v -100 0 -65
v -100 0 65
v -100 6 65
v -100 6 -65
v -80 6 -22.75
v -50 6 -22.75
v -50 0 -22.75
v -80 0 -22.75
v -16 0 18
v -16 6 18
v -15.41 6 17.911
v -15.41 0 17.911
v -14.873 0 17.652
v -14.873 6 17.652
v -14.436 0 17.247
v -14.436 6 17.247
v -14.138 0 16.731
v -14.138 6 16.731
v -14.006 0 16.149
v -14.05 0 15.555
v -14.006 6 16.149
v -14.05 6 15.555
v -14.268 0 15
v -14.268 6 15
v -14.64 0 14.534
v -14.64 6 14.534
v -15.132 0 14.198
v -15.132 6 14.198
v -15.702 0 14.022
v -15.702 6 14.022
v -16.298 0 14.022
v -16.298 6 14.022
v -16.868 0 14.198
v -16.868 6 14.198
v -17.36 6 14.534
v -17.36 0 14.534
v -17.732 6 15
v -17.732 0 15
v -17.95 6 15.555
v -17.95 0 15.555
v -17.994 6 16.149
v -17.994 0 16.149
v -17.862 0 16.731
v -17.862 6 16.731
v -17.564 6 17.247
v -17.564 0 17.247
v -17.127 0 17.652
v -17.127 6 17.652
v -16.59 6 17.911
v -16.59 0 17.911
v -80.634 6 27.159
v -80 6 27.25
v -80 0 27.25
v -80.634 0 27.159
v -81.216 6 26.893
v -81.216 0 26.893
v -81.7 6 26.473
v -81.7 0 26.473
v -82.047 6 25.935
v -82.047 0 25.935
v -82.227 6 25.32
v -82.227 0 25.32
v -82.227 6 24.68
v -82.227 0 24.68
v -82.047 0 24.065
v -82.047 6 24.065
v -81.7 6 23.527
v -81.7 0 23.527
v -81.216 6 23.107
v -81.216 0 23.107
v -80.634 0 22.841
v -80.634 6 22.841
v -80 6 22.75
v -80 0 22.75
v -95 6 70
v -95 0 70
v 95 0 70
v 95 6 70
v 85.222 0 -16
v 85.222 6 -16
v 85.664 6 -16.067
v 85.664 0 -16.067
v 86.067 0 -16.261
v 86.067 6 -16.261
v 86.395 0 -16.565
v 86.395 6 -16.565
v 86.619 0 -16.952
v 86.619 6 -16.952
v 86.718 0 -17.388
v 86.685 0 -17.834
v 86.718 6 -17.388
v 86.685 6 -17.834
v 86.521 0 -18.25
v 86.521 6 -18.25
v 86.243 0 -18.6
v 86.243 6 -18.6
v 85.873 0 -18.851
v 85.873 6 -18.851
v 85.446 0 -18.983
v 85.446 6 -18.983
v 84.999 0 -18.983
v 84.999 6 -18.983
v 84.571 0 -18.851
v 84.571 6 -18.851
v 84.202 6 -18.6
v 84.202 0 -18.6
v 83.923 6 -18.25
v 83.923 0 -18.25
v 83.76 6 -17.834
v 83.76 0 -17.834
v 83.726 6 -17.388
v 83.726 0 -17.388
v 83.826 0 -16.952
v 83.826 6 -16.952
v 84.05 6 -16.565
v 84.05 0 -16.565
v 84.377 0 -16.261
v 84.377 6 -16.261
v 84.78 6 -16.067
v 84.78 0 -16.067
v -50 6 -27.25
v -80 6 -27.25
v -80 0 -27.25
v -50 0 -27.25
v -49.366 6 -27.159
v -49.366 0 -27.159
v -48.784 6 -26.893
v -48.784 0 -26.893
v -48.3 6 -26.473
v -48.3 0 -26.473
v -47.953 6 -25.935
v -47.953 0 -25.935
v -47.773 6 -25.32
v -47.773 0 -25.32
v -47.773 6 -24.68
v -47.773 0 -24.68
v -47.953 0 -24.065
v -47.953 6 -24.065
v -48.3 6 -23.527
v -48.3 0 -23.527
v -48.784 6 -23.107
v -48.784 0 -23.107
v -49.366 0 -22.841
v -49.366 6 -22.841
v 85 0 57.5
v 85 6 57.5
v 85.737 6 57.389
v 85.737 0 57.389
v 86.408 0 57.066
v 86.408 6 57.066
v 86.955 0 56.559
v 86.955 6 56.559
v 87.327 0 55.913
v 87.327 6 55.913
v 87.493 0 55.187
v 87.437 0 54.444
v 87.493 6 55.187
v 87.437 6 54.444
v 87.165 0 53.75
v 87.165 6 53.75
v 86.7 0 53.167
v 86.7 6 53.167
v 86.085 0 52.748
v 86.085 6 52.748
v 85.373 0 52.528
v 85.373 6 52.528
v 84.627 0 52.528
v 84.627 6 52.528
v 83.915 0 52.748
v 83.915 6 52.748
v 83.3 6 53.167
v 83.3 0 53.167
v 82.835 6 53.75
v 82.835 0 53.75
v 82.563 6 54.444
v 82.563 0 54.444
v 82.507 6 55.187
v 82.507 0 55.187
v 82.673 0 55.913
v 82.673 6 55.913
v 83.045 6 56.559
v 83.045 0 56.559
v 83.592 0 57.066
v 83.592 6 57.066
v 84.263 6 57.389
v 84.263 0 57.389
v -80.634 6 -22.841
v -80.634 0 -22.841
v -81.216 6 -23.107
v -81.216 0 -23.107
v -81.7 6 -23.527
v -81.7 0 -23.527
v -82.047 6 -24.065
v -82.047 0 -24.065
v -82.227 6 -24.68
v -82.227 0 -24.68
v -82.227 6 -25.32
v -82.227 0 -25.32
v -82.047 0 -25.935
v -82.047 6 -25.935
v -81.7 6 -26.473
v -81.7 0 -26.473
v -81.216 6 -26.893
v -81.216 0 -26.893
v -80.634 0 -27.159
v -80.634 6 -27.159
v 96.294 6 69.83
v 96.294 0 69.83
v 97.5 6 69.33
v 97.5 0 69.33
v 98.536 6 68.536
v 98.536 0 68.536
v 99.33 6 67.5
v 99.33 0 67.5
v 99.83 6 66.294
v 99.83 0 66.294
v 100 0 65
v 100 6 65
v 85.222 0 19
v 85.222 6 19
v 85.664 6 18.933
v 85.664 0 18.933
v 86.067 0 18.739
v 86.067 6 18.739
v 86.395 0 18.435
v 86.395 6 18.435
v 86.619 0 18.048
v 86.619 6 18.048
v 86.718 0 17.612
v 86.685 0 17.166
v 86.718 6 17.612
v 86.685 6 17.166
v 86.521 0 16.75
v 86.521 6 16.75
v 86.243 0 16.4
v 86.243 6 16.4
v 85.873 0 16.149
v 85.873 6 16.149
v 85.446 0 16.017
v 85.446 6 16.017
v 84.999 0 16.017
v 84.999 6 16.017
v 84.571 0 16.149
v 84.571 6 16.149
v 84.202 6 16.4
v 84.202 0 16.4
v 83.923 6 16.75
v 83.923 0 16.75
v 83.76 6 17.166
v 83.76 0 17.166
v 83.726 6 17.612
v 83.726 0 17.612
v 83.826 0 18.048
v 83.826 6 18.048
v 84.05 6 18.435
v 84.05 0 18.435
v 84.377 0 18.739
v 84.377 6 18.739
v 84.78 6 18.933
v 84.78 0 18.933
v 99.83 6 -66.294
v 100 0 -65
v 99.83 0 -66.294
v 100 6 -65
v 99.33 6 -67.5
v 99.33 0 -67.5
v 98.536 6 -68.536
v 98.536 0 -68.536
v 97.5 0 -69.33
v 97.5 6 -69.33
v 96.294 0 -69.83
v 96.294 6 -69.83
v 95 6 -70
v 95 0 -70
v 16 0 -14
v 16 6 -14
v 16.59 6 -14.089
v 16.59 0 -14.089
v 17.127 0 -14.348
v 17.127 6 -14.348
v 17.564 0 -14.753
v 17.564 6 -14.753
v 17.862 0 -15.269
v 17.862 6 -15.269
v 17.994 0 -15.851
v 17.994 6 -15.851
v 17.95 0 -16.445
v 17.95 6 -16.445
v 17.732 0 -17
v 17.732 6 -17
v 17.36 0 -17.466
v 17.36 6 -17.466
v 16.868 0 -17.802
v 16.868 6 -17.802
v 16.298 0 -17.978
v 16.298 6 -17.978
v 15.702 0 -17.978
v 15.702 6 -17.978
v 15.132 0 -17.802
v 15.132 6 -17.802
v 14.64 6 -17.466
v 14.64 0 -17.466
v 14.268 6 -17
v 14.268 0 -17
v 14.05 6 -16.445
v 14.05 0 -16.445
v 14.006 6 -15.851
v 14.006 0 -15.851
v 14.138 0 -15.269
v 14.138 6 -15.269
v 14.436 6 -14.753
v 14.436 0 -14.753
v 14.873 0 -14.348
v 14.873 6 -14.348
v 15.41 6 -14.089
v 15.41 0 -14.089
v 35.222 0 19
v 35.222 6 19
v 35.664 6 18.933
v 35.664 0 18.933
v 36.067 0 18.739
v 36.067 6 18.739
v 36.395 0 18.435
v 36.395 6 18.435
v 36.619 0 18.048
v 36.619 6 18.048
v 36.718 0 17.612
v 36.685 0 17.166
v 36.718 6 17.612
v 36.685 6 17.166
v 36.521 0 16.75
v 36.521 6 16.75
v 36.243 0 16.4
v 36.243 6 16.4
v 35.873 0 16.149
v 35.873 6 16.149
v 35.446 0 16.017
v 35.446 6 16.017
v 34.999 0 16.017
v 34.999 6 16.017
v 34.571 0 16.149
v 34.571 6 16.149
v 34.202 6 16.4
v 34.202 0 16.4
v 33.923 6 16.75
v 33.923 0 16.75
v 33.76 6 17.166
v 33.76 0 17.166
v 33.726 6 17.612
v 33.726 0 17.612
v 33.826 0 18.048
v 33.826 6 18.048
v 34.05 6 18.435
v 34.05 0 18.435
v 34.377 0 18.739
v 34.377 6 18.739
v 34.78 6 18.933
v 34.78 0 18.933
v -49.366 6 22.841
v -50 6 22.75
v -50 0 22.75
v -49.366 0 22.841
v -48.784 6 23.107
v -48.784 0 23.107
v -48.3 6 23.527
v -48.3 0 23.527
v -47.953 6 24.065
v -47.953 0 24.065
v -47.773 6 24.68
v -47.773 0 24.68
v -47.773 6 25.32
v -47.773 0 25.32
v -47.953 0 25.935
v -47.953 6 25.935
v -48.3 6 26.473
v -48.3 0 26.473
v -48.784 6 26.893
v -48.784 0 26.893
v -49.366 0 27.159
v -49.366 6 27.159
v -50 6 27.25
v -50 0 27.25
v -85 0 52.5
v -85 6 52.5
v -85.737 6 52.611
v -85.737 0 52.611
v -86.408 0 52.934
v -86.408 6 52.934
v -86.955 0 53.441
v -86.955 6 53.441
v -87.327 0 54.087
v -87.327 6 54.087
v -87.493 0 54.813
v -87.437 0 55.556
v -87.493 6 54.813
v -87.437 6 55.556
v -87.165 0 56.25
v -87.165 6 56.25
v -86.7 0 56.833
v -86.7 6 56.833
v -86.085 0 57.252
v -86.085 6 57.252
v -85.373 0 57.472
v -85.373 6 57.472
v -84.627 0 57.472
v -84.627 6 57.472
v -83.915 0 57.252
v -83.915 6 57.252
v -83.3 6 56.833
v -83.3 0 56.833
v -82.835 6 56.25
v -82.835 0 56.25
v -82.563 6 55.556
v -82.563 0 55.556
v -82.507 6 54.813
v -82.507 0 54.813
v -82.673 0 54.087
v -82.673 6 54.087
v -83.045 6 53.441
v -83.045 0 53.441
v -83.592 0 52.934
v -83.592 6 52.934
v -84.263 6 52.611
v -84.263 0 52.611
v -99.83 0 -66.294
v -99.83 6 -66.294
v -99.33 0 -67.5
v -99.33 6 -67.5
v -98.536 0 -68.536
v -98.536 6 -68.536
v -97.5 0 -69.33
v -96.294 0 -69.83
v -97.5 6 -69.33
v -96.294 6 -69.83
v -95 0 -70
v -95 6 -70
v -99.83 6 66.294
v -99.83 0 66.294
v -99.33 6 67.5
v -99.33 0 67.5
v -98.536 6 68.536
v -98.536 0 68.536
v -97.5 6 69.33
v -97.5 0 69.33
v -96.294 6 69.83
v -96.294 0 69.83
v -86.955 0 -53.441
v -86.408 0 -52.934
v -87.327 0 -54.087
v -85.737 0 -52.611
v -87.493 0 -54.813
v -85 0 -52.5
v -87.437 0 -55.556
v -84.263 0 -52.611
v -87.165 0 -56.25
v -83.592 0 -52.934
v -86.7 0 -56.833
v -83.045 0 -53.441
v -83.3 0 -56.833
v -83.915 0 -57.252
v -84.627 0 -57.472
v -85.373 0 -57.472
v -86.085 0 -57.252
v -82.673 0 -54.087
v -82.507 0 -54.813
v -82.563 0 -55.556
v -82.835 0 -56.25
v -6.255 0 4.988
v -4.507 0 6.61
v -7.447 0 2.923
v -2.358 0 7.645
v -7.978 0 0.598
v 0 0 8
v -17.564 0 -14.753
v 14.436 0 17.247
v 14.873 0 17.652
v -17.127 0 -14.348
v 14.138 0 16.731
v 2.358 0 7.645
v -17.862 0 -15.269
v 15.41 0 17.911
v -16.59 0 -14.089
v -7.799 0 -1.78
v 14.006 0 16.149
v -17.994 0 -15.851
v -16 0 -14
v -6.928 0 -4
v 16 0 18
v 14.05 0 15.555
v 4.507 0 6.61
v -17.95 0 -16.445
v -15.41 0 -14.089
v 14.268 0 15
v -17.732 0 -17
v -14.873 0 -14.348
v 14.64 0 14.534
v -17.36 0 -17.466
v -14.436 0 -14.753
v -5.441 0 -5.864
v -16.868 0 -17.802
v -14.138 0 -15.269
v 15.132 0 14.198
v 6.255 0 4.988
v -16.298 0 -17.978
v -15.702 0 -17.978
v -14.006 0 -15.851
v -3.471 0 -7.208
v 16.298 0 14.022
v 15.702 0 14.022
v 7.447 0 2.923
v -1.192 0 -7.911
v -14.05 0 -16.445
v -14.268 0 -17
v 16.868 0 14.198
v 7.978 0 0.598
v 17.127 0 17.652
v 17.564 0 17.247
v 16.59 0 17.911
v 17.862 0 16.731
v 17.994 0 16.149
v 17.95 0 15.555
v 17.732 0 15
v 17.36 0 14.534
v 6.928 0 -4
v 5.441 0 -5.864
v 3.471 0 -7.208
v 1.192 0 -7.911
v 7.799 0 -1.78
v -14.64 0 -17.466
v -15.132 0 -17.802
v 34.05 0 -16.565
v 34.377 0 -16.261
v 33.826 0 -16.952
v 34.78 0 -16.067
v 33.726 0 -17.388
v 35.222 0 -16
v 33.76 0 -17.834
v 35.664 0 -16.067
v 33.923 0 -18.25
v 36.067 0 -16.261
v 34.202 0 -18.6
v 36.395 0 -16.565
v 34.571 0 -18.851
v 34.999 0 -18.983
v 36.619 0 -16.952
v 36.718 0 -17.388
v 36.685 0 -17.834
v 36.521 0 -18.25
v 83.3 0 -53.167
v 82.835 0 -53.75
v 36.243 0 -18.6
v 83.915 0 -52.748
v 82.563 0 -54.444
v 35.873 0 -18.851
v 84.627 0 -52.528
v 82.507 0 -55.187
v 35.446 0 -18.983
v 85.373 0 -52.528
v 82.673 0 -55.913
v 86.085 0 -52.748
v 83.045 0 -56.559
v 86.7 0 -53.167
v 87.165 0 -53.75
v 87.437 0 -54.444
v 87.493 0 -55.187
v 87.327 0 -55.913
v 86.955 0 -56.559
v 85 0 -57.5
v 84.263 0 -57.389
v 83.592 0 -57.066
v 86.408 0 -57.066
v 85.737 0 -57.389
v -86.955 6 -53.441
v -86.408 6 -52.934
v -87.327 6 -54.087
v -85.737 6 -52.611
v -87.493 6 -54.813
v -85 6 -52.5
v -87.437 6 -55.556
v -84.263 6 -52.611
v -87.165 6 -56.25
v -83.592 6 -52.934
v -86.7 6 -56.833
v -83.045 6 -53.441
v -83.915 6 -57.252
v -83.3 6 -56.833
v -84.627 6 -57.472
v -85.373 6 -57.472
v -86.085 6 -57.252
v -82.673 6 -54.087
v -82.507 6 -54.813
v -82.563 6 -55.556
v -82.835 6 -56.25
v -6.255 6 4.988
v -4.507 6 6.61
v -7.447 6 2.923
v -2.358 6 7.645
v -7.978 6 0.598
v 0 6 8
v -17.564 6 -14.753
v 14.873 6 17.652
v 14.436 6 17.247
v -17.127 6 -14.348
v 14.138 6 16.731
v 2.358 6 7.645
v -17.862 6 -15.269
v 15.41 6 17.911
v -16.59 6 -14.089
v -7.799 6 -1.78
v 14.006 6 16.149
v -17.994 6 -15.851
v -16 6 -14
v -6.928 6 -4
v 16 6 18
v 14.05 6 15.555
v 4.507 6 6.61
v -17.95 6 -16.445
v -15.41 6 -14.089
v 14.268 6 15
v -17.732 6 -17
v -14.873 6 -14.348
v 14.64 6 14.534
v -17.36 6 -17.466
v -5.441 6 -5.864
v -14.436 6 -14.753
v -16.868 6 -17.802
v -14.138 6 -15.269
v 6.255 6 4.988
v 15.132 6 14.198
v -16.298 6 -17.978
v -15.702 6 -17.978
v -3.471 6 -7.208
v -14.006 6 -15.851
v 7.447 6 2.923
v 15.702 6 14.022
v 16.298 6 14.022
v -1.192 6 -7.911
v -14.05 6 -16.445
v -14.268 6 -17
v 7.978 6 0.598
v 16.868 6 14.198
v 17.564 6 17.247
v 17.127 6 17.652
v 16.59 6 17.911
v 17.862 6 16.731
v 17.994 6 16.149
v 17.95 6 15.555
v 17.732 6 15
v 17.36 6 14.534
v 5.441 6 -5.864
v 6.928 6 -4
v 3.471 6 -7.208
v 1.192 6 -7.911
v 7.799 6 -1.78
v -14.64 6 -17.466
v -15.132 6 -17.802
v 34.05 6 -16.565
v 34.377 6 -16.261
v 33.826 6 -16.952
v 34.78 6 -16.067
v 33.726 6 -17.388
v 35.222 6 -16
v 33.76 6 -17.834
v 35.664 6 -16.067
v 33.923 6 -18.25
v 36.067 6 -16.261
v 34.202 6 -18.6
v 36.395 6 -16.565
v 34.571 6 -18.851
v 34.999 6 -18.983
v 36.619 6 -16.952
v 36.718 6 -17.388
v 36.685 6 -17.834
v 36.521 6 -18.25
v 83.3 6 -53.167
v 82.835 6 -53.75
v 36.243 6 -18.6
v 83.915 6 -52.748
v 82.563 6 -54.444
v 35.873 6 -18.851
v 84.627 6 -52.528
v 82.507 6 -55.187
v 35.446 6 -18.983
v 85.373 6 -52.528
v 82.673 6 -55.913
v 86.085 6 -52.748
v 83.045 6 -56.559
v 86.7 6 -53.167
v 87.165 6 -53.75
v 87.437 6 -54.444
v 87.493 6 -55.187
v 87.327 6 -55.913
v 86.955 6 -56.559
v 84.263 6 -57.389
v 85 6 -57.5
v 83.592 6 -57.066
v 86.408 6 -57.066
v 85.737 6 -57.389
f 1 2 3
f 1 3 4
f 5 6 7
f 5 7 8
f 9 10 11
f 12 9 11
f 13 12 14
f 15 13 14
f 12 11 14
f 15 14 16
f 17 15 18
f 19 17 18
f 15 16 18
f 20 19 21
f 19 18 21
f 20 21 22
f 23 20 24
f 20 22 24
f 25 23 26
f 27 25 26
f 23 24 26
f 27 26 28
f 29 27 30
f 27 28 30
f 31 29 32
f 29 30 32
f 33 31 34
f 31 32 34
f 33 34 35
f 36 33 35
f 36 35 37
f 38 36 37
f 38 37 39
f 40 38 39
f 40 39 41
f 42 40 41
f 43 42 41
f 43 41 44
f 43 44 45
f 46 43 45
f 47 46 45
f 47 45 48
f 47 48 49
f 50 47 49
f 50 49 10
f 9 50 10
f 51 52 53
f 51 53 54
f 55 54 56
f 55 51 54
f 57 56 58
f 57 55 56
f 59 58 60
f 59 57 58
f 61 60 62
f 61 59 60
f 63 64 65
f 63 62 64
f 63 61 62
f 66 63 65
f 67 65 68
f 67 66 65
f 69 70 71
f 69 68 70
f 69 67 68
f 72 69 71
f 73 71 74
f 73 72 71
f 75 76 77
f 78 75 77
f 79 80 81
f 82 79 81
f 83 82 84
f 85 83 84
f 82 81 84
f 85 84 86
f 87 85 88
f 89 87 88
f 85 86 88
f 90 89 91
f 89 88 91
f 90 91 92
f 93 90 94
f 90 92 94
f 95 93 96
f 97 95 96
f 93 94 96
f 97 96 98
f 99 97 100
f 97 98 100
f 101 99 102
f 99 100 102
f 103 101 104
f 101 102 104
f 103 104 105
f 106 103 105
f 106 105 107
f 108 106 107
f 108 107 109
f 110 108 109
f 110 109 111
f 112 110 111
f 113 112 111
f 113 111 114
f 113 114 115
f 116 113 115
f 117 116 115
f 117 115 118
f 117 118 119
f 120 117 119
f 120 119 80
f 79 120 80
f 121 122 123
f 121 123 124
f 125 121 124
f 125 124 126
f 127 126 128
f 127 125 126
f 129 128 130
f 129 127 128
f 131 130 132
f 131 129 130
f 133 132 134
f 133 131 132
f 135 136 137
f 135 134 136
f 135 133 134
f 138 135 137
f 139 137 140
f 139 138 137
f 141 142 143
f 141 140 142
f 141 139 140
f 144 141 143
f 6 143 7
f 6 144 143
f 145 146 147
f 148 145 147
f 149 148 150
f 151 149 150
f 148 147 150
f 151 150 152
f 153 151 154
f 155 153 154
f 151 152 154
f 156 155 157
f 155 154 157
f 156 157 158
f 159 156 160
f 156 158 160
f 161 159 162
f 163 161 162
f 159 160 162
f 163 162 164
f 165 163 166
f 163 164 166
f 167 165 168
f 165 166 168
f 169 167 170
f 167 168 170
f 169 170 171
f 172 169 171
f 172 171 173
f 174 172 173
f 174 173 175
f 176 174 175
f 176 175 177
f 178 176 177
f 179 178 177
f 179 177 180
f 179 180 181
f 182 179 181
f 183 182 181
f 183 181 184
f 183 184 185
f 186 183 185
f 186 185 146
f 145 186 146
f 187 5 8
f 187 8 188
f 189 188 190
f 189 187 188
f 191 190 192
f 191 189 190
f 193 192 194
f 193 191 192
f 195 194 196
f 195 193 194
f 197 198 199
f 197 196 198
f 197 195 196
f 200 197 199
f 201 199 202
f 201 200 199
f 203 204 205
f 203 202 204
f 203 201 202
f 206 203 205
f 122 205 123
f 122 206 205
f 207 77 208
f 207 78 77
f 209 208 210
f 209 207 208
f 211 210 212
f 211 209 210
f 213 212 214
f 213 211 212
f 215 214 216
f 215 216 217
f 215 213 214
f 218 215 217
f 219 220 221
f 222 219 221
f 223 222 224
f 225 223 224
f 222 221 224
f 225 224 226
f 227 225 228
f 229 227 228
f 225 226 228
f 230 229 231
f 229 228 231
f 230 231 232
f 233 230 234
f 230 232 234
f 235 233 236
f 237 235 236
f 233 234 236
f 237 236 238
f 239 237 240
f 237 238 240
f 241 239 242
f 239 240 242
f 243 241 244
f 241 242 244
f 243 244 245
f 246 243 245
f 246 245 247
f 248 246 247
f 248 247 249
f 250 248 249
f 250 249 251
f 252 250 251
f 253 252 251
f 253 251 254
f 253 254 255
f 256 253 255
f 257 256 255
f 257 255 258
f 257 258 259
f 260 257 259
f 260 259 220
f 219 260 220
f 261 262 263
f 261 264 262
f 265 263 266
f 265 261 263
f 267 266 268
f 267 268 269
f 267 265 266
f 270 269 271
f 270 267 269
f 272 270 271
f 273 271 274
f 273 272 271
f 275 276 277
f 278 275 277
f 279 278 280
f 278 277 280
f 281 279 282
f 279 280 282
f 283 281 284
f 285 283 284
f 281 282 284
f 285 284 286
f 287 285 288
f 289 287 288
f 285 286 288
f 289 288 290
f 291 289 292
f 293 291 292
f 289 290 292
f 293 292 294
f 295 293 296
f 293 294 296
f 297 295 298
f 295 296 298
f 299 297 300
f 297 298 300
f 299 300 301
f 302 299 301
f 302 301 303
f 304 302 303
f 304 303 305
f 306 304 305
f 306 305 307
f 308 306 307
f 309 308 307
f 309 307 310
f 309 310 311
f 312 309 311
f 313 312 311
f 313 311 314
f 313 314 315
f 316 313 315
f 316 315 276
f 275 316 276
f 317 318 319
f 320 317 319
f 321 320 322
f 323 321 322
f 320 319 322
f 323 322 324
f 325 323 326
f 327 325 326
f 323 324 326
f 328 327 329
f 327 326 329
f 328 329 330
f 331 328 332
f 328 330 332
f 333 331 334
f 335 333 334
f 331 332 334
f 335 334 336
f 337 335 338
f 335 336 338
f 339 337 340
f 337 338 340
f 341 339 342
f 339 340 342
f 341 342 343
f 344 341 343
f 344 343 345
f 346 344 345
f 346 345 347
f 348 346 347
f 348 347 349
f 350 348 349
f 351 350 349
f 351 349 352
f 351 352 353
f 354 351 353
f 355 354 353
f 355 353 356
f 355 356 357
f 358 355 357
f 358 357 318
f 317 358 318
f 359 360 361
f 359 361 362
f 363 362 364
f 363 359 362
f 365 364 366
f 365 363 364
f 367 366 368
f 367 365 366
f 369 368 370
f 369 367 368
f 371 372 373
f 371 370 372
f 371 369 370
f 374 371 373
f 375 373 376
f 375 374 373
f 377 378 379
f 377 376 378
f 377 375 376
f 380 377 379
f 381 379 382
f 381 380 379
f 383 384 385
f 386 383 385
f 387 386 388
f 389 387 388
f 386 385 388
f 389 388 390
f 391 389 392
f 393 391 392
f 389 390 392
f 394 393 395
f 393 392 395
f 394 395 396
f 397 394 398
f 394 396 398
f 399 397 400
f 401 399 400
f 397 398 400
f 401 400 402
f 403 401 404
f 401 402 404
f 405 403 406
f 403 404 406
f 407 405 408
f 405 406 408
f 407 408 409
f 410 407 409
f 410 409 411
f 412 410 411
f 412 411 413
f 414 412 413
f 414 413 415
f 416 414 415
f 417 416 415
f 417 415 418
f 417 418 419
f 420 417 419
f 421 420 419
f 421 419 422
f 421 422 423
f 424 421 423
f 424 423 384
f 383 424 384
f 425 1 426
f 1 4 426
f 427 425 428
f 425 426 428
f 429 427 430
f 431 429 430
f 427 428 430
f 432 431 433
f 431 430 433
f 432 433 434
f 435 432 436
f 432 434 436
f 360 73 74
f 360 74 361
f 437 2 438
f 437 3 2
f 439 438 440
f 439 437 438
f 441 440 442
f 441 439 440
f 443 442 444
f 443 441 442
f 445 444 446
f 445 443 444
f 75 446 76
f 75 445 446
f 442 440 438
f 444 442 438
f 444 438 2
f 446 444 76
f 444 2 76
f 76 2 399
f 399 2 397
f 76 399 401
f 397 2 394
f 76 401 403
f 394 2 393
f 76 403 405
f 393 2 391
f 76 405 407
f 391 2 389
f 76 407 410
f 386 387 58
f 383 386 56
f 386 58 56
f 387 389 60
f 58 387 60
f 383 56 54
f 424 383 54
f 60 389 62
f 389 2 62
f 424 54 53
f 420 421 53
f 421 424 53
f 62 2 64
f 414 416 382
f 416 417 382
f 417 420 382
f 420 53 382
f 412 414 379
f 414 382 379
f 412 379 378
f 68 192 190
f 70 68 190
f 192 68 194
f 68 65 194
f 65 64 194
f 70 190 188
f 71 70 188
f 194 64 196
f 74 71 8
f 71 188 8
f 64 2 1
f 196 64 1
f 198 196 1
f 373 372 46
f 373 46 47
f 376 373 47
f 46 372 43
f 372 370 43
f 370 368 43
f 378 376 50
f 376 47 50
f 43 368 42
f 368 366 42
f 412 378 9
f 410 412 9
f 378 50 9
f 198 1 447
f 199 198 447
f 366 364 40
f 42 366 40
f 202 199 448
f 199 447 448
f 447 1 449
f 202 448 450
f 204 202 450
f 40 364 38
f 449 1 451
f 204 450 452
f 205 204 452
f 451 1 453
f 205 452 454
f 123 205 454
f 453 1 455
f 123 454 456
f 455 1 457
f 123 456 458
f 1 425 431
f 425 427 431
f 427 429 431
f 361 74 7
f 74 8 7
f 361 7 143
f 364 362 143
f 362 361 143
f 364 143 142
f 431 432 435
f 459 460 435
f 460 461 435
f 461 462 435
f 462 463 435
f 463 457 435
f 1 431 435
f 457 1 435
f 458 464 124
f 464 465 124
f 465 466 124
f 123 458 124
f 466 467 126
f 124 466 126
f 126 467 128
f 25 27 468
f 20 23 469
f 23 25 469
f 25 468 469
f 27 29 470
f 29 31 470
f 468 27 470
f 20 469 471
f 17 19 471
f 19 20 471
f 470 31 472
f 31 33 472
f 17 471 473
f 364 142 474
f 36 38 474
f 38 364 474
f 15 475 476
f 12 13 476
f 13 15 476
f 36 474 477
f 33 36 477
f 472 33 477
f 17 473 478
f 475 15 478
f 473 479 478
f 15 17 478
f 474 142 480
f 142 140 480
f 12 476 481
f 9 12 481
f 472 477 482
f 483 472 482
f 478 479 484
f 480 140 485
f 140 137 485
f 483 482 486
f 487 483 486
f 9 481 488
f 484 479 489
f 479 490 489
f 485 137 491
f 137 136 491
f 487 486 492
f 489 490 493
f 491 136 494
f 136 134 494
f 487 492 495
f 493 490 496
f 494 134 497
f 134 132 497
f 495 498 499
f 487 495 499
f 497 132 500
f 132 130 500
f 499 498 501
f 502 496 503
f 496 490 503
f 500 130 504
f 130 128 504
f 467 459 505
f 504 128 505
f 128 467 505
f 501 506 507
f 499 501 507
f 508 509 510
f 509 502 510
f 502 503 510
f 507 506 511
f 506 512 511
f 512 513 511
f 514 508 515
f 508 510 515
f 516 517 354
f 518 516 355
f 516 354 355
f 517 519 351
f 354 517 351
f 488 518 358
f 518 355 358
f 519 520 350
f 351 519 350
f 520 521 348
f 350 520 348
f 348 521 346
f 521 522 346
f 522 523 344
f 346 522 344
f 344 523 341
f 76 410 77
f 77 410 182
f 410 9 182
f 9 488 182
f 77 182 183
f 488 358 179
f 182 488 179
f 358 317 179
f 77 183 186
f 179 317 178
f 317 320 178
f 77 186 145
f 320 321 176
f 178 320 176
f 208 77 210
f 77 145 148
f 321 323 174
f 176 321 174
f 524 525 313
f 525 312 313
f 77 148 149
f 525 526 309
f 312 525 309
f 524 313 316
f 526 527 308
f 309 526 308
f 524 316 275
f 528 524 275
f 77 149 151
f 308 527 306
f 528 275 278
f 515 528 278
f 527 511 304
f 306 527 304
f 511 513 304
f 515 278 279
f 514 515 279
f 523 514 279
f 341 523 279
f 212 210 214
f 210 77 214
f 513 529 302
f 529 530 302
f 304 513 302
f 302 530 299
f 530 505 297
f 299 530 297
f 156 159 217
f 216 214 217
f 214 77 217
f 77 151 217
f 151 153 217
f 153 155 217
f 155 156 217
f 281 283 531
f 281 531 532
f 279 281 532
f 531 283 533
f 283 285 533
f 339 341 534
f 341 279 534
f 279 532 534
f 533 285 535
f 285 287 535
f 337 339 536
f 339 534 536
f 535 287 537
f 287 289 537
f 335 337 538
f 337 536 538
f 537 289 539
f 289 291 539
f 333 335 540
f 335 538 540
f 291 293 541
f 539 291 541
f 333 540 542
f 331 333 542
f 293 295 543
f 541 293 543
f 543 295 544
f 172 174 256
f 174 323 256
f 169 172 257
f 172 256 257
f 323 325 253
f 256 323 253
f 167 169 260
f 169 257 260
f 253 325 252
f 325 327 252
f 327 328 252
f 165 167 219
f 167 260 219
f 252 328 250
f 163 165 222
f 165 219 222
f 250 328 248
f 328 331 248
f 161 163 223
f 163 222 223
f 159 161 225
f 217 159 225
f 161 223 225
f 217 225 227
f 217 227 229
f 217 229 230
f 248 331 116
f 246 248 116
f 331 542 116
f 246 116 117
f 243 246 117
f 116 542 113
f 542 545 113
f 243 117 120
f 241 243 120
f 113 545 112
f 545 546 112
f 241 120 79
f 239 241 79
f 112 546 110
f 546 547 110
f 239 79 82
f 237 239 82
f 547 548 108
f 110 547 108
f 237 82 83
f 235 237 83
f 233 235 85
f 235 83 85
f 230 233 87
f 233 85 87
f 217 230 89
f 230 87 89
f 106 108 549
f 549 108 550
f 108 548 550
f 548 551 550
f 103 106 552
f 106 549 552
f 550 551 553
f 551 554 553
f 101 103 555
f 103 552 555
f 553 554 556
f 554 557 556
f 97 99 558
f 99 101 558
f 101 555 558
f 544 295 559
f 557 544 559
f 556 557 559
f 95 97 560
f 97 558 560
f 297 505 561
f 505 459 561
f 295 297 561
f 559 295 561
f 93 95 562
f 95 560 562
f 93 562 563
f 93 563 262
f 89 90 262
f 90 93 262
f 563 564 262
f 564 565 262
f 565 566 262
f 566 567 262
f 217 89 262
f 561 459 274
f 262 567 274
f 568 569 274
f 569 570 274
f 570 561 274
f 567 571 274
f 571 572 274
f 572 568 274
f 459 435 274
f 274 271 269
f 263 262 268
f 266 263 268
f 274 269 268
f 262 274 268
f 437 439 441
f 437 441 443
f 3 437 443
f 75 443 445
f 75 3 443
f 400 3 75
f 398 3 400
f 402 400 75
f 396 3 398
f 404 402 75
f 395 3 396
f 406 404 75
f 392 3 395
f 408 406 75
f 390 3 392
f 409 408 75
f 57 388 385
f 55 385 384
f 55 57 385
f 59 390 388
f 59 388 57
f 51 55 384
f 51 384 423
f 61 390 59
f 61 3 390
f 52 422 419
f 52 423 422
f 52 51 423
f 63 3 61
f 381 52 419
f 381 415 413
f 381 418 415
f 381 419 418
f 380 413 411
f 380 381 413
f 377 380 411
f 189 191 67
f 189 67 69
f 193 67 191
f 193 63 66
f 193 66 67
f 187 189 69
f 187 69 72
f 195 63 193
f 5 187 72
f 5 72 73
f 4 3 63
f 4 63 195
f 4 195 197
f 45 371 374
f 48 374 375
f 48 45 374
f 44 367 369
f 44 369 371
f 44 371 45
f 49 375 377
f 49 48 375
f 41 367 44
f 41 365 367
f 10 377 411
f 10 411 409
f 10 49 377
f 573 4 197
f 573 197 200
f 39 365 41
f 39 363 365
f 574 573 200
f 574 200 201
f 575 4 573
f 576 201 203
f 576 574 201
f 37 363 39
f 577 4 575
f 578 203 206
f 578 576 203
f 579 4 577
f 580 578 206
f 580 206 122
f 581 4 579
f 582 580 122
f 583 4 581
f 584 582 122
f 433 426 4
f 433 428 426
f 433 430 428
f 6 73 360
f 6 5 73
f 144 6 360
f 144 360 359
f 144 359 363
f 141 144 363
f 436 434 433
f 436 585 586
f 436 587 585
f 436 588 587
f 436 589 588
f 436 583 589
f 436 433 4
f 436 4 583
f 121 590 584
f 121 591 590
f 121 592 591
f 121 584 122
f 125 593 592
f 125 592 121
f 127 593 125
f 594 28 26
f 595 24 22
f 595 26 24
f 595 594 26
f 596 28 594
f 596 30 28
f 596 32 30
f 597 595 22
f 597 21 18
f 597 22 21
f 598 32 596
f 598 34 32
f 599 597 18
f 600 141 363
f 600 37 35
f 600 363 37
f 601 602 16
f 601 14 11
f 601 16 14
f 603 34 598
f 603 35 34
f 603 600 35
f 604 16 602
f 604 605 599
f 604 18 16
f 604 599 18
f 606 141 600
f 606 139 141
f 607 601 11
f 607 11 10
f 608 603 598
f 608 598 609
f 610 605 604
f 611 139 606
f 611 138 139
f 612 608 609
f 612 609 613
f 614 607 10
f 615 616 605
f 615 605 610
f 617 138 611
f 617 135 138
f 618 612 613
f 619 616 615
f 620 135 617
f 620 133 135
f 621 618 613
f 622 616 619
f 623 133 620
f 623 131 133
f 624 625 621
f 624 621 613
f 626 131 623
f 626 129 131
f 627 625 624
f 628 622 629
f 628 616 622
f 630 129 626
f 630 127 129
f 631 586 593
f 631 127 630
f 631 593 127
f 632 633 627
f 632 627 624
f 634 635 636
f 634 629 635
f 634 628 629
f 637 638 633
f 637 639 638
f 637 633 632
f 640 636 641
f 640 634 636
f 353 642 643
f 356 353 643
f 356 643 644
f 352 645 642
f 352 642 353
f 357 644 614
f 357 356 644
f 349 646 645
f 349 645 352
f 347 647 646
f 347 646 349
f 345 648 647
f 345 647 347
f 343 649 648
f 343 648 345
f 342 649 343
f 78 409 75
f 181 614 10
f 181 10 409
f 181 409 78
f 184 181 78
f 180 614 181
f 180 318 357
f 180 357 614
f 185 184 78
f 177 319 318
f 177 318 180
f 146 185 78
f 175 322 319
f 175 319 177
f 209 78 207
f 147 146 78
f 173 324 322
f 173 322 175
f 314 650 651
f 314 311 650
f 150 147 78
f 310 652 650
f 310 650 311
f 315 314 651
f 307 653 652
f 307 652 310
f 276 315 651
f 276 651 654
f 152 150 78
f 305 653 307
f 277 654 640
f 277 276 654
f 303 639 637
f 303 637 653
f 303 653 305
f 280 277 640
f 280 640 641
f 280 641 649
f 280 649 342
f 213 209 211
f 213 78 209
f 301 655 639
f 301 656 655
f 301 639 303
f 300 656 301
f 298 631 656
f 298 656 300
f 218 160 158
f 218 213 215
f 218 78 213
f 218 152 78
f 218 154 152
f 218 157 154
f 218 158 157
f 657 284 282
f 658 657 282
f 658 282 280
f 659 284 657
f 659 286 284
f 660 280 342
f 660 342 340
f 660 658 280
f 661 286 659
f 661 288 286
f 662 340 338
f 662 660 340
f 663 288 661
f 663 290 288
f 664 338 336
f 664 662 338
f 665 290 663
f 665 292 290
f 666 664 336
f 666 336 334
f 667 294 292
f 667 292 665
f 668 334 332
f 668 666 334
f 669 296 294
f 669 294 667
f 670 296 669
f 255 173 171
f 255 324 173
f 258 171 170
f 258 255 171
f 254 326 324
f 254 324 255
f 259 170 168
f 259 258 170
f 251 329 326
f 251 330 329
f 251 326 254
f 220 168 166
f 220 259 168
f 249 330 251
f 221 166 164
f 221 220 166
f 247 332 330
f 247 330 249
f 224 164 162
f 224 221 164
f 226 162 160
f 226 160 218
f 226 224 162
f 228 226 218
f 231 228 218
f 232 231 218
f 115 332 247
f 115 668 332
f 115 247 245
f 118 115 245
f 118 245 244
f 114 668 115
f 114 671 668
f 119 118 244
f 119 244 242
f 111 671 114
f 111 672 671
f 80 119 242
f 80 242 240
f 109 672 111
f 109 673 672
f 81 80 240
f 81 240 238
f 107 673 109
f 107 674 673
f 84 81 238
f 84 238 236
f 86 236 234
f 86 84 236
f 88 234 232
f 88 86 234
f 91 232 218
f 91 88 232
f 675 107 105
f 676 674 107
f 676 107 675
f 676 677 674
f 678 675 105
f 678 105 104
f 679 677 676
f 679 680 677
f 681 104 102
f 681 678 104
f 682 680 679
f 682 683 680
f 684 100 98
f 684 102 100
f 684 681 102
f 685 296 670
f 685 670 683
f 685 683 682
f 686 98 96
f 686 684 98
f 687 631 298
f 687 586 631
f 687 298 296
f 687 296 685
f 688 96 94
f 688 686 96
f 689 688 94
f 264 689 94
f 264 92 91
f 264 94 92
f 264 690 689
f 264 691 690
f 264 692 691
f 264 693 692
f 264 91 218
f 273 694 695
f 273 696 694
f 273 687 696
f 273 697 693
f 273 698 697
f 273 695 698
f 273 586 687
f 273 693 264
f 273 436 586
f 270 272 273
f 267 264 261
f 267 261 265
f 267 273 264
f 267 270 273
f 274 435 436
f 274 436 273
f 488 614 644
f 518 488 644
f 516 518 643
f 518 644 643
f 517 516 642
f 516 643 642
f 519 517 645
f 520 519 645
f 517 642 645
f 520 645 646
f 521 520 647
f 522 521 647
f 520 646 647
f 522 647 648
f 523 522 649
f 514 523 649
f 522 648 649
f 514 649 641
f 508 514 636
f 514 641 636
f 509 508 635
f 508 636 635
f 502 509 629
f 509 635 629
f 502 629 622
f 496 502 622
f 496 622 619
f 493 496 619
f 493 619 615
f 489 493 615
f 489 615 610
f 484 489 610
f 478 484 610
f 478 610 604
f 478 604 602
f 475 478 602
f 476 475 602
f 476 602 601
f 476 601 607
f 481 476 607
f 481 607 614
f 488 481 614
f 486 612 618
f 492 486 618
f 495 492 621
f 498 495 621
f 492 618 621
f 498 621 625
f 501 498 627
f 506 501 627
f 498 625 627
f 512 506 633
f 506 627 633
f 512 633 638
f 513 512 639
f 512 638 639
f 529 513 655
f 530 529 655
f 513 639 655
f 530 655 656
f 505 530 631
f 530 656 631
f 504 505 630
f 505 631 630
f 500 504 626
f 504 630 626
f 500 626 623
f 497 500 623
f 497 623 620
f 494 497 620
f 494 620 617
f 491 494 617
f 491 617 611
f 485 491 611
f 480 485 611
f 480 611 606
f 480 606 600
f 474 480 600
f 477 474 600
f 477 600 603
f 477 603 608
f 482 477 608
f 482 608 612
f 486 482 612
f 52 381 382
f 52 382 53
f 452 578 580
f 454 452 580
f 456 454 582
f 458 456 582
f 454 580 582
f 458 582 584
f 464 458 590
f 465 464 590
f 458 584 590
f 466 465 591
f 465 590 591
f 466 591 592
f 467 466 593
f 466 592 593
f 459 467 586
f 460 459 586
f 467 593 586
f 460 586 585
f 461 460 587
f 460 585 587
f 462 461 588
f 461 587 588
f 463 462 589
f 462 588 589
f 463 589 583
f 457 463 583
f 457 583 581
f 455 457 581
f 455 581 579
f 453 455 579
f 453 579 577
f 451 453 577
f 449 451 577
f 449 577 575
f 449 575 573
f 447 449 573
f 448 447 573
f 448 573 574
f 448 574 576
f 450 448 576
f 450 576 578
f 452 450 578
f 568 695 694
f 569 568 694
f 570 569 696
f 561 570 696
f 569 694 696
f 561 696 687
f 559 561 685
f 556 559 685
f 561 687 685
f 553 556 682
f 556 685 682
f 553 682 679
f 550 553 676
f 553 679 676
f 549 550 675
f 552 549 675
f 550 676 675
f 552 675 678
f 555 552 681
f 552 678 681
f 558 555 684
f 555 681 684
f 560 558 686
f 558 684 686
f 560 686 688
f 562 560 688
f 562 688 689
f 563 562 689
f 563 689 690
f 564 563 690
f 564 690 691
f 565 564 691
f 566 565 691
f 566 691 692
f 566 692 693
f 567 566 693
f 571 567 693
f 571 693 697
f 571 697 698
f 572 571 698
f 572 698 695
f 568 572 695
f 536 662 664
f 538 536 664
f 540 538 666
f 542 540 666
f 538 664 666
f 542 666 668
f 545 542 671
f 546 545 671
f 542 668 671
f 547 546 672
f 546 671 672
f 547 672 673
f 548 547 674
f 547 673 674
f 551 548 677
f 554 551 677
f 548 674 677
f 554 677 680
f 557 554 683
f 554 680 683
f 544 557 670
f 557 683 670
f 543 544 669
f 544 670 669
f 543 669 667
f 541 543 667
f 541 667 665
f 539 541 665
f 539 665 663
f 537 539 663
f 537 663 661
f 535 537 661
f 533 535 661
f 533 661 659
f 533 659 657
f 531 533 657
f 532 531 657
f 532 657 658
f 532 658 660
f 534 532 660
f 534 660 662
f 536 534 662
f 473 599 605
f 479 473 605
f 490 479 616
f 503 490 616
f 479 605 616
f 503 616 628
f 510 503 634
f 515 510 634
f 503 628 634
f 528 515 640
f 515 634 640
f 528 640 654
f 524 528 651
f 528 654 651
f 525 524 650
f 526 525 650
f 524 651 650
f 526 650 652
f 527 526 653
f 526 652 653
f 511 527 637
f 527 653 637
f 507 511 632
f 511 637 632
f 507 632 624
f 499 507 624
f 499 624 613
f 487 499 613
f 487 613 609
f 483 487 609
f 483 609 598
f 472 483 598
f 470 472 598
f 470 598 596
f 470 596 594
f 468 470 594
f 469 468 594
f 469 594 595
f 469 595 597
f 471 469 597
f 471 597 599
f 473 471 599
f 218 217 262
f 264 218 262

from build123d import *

# Parameters (mm, degrees)
SKETCH2_W           = 200
SKETCH2_H           = 140
BOSS_EXTRUDE1_DEPTH = 6
FILLET1_R           = 5
SKETCH3_R           = 2.5
CUT_EXTRUDE1_DEPTH  = 123.21292894
SKETCH4_R           = 8
CUT_EXTRUDE2_DEPTH  = 123.21292894
SKETCH5_R           = 2
CUT_EXTRUDE3_DEPTH  = 123.21292894
CUT_EXTRUDE4_DEPTH  = 123.21292894
SKETCH7_R           = 1.5
CUT_EXTRUDE5_DEPTH  = 123.21292894


with BuildPart() as part:
    # Sketch2 → Boss-Extrude1 (new body)
    with BuildSketch(Plane(origin=(0, 0, 0), x_dir=(1, 0, 0), z_dir=(0, 1, 0))):
        Rectangle(SKETCH2_W, SKETCH2_H)
    extrude(amount=BOSS_EXTRUDE1_DEPTH)

    # Fillet1
    fillet1_edges = [part.edges().sort_by_distance(p)[0] for p in [
        (100, 3, 70),
        (-100, 3, 70),
        (-100, 3, -70),
        (100, 3, -70),
    ]]
    fillet(fillet1_edges, radius=FILLET1_R)

    # Sketch3 → Cut-Extrude1 (cut, through all)
    with BuildSketch(Plane(origin=(0, 6, 0), x_dir=(1, 0, 0), z_dir=(0, 1, 0))):
        with Locations(Location((-85, 55, 0), (0, 0, 270))):
            Circle(SKETCH3_R)
        with Locations(Location((-85, -55, 0), (0, 0, 90))):
            Circle(SKETCH3_R)
        with Locations(Location((85, -55, 0), (0, 0, 270))):
            Circle(SKETCH3_R)
        with Locations(Location((85, 55, 0), (0, 0, 90))):
            Circle(SKETCH3_R)
    extrude(amount=-CUT_EXTRUDE1_DEPTH, mode=Mode.SUBTRACT)

    # Sketch4 → Cut-Extrude2 (cut, through all)
    with BuildSketch(Plane(origin=(0, 6, 0), x_dir=(1, 0, 0), z_dir=(0, 1, 0))):
        with Locations(Location((0, 0, 0), (0, 0, 270))):
            Circle(SKETCH4_R)
    extrude(amount=-CUT_EXTRUDE2_DEPTH, mode=Mode.SUBTRACT)

    # Sketch5 → Cut-Extrude3 (cut, through all)
    with BuildSketch(Plane(origin=(0, 6, 0), x_dir=(1, 0, 0), z_dir=(0, 1, 0))):
        with Locations(Location((16, 16, 0), (0, 0, 270))):
            Circle(SKETCH5_R)
        with Locations(Location((16, -16, 0), (0, 0, 270))):
            Circle(SKETCH5_R)
        with Locations(Location((-16, -16, 0), (0, 0, 270))):
            Circle(SKETCH5_R)
        with Locations(Location((-16, 16, 0), (0, 0, 270))):
            Circle(SKETCH5_R)
    extrude(amount=-CUT_EXTRUDE3_DEPTH, mode=Mode.SUBTRACT)

    # Sketch6 → Cut-Extrude4 (cut, through all)
    with BuildSketch(Plane(origin=(0, 6, 0), x_dir=(1, 0, 0), z_dir=(0, 1, 0))):
        with BuildLine():
            Line((-80, 27.25), (-50, 27.25))
            ThreePointArc((-50, 27.25), (-47.75, 25), (-50, 22.75))
            Line((-50, 22.75), (-80, 22.75))
            ThreePointArc((-80, 22.75), (-82.25, 25), (-80, 27.25))
        make_face()
        with BuildLine():
            Line((-80, -22.75), (-50, -22.75))
            ThreePointArc((-50, -22.75), (-47.75, -25), (-50, -27.25))
            Line((-50, -27.25), (-80, -27.25))
            ThreePointArc((-80, -27.25), (-82.25, -25), (-80, -22.75))
        make_face()
    extrude(amount=-CUT_EXTRUDE4_DEPTH, mode=Mode.SUBTRACT)

    # Sketch7 → Cut-Extrude5 (cut, through all)
    with BuildSketch(Plane(origin=(0, 6, 0), x_dir=(1, 0, 0), z_dir=(0, 1, 0))):
        with Locations(Location((35.22226737, -17.5, 0), (0, 0, 270))):
            Circle(SKETCH7_R)
        with Locations(Location((35.22226737, 17.5, 0), (0, 0, 270))):
            Circle(SKETCH7_R)
        with Locations(Location((85.22226737, 17.5, 0), (0, 0, 270))):
            Circle(SKETCH7_R)
        with Locations(Location((85.22226737, -17.5, 0), (0, 0, 270))):
            Circle(SKETCH7_R)
    extrude(amount=-CUT_EXTRUDE5_DEPTH, mode=Mode.SUBTRACT)


solid = part.part
